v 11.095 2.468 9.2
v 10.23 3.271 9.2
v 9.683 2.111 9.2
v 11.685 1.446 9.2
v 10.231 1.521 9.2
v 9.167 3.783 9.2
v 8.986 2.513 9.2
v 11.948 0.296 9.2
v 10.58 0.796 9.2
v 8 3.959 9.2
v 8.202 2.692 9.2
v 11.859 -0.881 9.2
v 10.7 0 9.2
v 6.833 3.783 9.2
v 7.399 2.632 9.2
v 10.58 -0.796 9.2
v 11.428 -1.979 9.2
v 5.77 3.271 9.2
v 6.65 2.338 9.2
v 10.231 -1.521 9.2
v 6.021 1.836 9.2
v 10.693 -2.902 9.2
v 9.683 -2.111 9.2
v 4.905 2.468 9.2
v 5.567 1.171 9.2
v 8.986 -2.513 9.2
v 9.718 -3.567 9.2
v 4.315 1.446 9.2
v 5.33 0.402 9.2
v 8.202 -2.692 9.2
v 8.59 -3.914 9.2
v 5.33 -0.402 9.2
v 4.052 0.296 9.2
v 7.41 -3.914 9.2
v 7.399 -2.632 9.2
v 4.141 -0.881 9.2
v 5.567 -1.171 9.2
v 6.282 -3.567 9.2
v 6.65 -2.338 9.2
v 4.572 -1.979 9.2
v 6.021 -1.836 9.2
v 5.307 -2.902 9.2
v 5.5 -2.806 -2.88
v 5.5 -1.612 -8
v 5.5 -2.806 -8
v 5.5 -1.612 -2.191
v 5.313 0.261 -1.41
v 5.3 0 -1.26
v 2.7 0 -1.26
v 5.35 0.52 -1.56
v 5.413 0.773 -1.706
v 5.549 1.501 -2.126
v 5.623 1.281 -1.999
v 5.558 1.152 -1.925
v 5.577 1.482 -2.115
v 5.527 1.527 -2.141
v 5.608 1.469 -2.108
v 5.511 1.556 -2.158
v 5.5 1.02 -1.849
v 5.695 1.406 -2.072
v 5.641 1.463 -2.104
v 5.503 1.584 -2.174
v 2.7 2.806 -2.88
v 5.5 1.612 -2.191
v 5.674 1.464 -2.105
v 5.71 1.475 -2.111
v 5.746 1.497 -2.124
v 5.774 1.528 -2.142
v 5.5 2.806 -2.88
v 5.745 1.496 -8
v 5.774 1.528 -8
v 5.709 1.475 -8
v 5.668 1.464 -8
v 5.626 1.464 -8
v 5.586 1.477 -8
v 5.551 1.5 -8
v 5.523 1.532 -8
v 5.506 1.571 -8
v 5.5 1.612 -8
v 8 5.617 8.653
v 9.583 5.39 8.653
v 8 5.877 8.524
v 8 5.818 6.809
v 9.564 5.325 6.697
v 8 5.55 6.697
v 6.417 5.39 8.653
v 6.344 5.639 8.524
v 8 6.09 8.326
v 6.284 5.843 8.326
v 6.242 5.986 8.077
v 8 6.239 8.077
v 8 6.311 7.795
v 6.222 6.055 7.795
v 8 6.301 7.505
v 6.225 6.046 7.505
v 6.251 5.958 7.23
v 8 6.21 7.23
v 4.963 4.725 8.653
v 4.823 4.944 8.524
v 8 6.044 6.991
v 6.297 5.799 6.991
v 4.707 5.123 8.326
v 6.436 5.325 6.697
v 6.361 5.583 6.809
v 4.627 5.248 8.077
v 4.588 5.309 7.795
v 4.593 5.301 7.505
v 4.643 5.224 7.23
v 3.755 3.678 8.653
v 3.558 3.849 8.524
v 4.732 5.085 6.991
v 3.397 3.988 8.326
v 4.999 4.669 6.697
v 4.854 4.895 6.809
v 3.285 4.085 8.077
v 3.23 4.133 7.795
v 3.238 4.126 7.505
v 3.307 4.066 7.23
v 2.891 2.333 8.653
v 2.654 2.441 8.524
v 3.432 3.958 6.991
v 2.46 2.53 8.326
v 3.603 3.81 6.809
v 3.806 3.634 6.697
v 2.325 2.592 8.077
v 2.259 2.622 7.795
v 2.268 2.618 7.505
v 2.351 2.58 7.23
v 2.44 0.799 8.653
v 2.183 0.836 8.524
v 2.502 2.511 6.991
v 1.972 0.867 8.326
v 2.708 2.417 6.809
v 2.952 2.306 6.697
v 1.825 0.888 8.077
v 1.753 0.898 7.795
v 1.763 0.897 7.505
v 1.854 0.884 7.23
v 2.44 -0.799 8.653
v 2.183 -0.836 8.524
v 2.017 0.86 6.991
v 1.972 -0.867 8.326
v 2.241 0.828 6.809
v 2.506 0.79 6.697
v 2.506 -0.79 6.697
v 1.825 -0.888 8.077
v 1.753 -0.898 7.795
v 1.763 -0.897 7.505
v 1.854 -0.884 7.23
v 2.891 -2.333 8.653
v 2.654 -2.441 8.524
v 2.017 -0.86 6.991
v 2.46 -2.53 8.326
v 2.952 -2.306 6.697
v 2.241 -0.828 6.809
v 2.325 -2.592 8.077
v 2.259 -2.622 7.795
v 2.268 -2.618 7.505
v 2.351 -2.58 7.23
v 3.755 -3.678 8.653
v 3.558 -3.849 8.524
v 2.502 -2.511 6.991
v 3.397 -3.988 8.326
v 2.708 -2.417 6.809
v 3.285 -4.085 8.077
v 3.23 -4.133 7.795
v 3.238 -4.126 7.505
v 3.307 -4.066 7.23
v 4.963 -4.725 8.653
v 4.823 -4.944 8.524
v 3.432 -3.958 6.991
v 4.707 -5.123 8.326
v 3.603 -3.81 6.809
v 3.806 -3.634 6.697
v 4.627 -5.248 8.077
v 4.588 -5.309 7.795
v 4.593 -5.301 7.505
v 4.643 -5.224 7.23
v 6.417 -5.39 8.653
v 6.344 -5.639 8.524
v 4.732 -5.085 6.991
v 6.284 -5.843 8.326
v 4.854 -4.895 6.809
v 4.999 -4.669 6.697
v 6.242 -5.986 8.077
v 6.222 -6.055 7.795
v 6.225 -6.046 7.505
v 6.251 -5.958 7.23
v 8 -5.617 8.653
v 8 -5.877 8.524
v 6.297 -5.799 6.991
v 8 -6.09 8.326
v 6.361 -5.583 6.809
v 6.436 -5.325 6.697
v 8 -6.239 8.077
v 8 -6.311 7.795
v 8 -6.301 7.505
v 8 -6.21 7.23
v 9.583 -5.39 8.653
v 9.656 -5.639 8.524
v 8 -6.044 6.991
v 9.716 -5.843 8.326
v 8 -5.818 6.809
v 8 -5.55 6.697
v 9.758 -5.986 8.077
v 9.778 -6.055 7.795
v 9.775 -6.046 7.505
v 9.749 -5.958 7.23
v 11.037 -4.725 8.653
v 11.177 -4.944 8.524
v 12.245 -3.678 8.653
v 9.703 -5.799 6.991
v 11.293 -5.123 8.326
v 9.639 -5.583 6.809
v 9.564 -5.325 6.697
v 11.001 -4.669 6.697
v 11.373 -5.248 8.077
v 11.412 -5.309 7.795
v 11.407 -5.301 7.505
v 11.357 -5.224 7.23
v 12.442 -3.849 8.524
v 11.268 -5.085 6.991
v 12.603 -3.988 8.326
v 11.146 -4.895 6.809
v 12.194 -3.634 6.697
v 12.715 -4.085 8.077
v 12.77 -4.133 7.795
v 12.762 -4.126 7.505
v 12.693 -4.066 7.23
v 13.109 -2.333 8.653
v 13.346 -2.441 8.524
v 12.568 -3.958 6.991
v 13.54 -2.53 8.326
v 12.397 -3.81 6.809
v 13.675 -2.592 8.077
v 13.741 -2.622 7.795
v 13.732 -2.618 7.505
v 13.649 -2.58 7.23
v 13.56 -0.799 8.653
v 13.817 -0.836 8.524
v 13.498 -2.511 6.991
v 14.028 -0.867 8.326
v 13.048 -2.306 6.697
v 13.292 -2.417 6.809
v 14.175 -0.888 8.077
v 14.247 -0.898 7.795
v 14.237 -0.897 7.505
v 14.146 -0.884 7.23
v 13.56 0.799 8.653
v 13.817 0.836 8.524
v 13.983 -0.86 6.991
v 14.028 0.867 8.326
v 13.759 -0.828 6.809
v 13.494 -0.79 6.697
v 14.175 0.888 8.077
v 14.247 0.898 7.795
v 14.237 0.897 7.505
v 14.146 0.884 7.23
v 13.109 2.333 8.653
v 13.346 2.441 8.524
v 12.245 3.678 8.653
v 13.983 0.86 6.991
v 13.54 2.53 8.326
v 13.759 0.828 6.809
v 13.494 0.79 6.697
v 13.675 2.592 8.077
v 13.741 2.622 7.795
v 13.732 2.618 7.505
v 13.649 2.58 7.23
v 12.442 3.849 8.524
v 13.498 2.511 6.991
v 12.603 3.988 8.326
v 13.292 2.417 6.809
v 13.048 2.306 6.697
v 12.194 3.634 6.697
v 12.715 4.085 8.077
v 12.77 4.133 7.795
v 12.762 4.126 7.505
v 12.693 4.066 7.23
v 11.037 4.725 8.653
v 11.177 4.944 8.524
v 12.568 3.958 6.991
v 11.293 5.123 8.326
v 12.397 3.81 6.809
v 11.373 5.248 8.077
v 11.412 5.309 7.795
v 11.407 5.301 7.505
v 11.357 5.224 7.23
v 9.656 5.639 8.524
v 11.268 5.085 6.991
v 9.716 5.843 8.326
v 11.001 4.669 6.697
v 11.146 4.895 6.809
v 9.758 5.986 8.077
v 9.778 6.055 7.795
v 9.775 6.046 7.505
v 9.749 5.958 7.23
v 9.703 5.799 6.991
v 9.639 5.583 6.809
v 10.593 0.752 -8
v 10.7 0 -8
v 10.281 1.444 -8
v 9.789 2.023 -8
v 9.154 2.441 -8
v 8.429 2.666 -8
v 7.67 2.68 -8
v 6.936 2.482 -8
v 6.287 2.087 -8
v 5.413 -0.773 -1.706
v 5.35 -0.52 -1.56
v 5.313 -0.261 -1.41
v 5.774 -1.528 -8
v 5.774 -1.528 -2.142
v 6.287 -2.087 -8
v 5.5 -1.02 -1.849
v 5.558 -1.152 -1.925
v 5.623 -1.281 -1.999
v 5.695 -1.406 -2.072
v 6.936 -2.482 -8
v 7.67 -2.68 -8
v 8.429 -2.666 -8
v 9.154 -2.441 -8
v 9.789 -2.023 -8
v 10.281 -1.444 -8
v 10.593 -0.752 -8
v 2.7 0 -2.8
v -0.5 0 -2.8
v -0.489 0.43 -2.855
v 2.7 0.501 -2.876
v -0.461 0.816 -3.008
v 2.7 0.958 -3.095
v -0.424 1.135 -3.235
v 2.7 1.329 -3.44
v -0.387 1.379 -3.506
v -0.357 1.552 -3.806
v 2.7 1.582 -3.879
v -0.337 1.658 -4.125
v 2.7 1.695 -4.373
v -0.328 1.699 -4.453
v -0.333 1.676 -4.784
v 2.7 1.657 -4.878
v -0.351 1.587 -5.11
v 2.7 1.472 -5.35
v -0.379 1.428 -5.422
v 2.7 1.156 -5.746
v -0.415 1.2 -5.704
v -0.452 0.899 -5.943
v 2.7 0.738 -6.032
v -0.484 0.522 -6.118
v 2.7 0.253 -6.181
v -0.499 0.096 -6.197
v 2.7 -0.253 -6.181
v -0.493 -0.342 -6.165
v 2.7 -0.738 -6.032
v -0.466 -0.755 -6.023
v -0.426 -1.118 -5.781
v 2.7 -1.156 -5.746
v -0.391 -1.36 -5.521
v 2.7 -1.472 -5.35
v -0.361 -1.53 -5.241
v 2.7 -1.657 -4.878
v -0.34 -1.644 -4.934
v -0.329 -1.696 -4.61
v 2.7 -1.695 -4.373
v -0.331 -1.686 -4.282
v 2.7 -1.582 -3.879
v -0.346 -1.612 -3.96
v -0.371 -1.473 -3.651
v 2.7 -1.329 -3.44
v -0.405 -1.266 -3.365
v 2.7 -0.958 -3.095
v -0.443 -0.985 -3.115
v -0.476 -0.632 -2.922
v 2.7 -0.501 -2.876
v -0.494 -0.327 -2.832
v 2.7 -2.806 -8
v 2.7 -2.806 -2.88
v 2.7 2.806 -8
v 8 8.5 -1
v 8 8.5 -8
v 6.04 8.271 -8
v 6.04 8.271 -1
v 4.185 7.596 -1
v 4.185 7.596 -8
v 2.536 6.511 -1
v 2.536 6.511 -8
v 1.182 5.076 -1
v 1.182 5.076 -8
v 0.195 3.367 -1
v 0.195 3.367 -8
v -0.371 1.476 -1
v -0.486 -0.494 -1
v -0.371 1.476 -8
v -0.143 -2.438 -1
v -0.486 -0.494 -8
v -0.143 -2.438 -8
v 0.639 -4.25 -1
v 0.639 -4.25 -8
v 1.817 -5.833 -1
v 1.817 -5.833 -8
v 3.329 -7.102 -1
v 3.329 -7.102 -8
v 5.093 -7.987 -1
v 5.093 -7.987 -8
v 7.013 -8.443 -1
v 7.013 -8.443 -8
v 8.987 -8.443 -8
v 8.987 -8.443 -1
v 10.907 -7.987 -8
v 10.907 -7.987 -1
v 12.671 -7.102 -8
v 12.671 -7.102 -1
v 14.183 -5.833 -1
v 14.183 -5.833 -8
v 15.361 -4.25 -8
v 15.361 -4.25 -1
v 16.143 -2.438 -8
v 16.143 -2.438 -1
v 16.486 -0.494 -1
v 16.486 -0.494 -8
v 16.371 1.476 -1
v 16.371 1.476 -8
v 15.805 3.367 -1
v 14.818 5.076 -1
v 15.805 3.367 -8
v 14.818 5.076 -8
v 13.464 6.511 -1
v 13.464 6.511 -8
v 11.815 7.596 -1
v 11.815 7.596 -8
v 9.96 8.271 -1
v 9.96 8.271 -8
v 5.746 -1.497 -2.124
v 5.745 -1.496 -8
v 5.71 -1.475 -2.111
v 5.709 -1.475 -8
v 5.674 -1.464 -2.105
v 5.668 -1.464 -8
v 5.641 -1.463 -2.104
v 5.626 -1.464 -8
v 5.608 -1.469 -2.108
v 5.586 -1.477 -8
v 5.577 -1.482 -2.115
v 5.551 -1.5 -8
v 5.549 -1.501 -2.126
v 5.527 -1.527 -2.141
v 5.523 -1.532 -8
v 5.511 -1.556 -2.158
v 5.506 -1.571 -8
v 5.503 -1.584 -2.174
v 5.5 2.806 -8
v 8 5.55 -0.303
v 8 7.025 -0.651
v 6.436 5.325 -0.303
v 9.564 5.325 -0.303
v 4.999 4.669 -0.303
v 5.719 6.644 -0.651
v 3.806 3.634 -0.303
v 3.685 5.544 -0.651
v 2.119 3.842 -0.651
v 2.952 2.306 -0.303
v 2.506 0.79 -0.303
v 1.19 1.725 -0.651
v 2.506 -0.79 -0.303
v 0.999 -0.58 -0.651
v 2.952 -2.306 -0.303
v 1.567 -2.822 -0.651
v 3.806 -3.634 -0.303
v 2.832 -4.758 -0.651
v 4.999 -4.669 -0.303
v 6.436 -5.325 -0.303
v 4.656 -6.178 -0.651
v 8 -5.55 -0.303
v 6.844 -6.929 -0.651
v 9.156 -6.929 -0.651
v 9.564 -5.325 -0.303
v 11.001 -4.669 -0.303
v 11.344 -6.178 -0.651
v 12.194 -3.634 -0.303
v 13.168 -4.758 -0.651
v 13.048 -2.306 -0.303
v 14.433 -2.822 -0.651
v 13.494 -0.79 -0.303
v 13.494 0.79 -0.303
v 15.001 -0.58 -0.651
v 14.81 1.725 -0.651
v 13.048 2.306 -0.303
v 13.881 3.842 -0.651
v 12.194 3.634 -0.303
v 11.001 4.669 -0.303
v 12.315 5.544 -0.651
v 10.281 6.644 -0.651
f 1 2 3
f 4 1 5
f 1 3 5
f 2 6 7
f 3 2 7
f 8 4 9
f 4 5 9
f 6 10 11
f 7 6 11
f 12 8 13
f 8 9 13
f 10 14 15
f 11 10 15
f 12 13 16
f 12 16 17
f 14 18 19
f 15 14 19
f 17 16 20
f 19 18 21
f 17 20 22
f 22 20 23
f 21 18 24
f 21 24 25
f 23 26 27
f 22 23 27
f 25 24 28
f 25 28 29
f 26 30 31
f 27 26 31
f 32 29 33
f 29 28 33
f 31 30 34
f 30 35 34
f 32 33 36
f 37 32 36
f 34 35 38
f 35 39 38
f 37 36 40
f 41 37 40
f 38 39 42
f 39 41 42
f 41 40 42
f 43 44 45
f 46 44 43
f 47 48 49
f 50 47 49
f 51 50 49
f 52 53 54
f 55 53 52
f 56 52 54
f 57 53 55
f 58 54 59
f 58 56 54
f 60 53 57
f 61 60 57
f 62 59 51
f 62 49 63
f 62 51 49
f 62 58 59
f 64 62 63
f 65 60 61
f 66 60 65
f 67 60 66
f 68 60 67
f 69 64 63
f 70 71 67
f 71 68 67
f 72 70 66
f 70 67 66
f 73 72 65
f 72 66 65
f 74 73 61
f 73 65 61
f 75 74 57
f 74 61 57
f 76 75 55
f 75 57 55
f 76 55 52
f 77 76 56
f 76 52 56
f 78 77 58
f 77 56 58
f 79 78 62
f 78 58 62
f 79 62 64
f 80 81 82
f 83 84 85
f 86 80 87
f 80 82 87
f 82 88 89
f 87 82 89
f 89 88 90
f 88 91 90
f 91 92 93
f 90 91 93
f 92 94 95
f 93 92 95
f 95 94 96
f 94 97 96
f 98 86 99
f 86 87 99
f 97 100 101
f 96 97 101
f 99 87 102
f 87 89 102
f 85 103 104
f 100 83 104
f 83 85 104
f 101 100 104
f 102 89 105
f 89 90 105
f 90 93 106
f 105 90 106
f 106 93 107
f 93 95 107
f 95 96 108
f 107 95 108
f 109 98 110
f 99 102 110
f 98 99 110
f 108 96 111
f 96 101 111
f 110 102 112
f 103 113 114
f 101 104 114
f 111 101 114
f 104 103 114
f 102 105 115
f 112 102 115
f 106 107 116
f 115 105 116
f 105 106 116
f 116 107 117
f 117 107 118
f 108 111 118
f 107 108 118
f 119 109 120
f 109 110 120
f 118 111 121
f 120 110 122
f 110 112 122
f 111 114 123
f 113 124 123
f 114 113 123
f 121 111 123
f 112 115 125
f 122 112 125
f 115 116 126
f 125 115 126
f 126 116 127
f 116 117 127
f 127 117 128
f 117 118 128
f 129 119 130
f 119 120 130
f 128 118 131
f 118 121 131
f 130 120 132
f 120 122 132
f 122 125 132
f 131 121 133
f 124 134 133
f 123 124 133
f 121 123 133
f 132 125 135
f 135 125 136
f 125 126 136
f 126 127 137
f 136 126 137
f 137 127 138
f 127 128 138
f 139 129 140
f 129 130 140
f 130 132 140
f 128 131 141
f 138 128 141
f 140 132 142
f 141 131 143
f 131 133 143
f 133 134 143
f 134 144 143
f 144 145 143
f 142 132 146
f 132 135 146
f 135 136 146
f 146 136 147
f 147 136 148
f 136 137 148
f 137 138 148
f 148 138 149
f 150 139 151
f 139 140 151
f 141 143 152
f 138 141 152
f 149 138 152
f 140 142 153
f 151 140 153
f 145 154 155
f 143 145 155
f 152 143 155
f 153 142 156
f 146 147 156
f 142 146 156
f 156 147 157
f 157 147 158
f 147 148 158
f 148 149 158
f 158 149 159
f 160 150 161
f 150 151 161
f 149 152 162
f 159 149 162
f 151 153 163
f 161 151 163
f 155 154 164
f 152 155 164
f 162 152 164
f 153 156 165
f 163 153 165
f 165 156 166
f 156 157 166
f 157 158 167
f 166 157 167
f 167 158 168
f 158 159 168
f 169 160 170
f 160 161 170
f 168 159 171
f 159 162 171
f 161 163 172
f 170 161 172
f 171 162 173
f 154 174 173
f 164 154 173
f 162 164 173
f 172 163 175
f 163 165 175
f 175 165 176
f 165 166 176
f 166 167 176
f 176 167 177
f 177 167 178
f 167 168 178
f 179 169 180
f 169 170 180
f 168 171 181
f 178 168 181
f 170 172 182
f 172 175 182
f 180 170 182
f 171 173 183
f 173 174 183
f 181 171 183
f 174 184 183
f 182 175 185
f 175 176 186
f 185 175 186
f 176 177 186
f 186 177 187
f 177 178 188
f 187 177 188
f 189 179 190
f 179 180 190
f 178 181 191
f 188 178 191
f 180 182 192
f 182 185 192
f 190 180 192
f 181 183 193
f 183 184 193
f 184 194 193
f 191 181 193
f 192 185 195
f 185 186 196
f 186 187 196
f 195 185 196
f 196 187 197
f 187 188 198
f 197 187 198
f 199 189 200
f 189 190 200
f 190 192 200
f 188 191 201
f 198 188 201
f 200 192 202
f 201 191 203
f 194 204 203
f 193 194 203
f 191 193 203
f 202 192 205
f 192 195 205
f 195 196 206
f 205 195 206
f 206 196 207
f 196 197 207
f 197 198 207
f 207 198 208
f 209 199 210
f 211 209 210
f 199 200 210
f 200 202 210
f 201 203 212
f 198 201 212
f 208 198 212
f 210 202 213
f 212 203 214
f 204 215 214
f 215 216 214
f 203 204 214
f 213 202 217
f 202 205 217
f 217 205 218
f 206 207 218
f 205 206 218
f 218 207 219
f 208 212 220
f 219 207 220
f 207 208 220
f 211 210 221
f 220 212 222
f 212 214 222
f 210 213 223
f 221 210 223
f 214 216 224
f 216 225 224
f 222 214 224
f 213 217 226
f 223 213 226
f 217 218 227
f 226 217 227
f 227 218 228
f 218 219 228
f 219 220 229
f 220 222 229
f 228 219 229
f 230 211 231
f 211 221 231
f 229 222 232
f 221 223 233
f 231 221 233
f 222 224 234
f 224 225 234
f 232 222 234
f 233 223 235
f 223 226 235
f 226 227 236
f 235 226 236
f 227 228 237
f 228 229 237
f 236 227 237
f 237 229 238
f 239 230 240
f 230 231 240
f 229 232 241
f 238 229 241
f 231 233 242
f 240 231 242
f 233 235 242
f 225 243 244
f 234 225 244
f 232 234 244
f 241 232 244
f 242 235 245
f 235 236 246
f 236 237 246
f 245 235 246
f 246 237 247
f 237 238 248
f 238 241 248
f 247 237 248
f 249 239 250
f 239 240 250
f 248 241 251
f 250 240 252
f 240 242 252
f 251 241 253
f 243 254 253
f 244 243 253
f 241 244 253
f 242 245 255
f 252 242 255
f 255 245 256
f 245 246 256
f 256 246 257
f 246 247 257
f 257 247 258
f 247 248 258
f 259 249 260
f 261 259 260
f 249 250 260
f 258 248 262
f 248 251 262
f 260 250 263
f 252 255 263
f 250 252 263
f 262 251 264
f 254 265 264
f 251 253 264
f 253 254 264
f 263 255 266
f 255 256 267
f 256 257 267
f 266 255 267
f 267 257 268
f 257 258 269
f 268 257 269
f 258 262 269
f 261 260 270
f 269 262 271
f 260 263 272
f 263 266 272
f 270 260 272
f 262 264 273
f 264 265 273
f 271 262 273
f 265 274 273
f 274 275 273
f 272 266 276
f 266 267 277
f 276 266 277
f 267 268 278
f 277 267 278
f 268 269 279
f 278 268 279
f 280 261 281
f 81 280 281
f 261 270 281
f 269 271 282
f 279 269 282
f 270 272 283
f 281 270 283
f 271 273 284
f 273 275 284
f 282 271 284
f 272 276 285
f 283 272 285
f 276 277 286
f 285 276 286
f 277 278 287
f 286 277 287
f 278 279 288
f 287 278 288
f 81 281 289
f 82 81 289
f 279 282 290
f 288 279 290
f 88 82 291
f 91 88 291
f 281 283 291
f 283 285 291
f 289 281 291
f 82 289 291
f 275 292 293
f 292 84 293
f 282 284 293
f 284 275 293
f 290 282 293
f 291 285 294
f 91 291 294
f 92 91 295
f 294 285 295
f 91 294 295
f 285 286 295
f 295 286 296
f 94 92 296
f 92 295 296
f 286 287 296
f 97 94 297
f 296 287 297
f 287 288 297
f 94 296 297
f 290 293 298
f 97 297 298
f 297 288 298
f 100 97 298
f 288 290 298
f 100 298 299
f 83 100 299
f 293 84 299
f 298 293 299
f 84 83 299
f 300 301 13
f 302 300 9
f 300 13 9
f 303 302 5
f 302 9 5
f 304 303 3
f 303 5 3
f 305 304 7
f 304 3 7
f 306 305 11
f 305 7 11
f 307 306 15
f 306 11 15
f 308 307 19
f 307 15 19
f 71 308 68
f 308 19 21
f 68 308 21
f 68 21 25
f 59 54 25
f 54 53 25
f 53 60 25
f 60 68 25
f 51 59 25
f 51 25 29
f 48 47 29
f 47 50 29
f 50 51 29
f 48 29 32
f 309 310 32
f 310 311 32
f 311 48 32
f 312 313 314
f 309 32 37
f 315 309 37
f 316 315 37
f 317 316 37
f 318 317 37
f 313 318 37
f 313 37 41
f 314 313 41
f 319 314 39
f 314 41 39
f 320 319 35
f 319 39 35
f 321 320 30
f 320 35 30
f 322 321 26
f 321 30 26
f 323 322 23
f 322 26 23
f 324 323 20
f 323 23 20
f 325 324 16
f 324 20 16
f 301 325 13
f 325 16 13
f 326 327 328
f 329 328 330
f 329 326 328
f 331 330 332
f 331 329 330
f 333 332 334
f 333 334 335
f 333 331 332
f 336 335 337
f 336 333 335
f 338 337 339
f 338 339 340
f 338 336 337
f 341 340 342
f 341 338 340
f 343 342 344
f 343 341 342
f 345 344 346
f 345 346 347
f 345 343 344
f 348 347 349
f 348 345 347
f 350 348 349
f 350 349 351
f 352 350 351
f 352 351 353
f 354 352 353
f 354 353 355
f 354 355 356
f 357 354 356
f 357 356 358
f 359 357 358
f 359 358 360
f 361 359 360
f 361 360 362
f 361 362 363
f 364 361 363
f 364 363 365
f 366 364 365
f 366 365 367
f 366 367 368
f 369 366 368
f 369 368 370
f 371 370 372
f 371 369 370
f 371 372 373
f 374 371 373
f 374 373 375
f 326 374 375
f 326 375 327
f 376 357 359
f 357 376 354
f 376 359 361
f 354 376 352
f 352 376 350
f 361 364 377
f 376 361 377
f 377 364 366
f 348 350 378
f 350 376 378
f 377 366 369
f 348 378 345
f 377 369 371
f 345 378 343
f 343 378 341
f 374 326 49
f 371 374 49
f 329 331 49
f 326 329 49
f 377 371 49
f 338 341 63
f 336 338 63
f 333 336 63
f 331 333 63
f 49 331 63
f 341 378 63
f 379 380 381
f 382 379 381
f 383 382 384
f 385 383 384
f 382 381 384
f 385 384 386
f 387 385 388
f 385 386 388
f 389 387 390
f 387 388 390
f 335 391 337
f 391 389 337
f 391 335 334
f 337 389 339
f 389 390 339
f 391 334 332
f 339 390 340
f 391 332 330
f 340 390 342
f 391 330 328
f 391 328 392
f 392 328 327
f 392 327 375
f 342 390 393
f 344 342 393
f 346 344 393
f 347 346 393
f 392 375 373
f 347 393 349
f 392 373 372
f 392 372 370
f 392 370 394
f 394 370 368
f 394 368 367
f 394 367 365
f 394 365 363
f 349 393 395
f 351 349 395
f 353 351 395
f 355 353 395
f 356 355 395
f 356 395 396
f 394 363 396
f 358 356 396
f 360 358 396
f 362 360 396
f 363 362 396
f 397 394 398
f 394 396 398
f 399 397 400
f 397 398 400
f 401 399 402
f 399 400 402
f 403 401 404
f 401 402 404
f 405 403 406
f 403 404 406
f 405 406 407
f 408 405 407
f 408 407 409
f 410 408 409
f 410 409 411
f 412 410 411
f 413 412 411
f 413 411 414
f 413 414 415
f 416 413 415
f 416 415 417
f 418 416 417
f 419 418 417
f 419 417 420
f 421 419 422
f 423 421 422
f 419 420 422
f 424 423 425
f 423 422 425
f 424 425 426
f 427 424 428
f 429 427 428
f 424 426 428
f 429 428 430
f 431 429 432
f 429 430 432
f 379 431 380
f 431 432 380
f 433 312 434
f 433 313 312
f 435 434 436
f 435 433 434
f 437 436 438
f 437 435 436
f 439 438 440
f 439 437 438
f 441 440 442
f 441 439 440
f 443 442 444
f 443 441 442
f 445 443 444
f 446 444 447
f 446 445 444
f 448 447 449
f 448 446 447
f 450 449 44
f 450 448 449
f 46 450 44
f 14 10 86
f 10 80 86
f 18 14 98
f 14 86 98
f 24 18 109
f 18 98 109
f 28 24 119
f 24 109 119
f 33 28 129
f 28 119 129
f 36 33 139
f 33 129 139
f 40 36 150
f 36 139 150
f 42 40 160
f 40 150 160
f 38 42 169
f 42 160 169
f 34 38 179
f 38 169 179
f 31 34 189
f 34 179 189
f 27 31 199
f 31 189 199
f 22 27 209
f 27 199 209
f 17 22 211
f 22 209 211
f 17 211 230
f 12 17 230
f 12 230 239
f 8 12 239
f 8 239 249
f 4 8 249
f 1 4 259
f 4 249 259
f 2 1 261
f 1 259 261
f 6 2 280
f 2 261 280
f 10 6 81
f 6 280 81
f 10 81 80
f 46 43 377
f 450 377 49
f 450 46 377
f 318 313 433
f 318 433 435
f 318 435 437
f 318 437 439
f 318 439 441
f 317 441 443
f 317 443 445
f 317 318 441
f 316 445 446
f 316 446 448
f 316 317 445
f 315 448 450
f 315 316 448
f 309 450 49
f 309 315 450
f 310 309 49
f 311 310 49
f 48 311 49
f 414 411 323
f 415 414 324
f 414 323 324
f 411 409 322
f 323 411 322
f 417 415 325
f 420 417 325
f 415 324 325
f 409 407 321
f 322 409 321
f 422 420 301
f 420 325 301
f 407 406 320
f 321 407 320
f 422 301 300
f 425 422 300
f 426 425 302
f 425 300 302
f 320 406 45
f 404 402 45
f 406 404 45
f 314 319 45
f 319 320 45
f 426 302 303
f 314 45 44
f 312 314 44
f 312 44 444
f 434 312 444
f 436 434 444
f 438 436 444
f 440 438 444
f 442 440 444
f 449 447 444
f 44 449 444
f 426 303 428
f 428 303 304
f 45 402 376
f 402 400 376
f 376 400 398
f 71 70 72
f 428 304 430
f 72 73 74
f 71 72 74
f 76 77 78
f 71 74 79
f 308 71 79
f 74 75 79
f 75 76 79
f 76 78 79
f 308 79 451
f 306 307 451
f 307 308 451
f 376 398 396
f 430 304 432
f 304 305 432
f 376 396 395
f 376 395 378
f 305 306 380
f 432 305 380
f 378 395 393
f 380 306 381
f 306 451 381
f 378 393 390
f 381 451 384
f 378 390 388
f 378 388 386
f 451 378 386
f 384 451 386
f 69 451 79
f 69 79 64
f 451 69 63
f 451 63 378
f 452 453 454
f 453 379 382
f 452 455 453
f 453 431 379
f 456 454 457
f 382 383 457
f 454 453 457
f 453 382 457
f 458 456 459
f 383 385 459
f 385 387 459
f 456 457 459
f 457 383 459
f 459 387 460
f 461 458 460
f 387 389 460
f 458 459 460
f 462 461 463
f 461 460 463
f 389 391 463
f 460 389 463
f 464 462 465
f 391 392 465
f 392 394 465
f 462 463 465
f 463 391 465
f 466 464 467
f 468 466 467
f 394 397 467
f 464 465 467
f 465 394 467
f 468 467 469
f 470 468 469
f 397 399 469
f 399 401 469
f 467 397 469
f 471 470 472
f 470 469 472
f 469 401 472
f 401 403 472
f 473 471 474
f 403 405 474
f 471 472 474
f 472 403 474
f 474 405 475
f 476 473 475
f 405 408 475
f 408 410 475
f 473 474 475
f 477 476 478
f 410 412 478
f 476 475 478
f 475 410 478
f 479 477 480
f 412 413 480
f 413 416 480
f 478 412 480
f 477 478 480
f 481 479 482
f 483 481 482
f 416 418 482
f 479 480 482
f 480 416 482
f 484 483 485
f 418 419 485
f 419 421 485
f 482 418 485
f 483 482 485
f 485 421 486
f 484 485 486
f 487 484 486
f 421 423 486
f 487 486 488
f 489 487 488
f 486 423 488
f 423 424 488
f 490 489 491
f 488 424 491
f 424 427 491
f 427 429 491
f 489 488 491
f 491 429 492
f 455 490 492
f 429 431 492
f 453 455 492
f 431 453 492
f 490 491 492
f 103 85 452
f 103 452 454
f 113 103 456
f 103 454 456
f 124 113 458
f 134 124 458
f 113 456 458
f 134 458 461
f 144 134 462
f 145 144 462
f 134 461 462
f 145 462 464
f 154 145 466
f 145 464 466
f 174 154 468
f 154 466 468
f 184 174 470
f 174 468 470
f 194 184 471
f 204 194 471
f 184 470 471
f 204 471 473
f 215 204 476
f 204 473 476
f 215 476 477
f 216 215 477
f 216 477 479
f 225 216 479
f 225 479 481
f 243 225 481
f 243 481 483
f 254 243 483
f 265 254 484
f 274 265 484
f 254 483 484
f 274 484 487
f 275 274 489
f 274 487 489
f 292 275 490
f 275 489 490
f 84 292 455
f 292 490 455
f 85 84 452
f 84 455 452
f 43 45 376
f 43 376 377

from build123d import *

# Parameters (mm, degrees)
BORE_START          = 1
SKETCH_2_R          = 2.7
BORE_DEPTH          = 22.98427983
FIX_START           = 3.2
SKETCH_4_R          = 1.7
FIX_2_DEPTH         = 18.78427983
CUT_EXTRUDE_START   = 2.5
CUT_EXTRUDE_1_DEPTH = 2.8
MOVE_BODY_1_ANGLE   = 90
FILLET_1_R          = 0.15


with BuildPart() as part:
    # Эскиз1 → Body (revolve)
    with BuildSketch(Plane.XY):
        with BuildLine():
            Line((0, 8.5), (0, 0))
            Line((0, 0), (17.2, 0))
            Line((17.2, 0), (17.2, 3.958583851))
            Line((17.2, 3.958583851), (16.652924896, 5.61704678))
            ThreePointArc((16.652924896, 5.61704678), (15.650028154, 6.31642018), (14.697387016, 5.55))
            Line((14.697387016, 5.55), (7.697387016, 5.55))
            Line((7.697387016, 5.55), (7, 8.5))
            Line((7, 8.5), (0, 8.5))
        make_face()
    revolve(axis=Axis((0, 0, 0), (1, 0, 0)))

    # Эскиз2 → Bore (cut, through all)
    with BuildSketch(Plane(origin=(17.2, 0, 0), x_dir=(0, 0, -1), z_dir=(1, 0, 0)).offset(BORE_START)):
        Circle(SKETCH_2_R)
    extrude(amount=-BORE_DEPTH, mode=Mode.SUBTRACT)

    # Эскиз4 → Fix 2 (cut, through all)
    with BuildSketch(Plane.XY.offset(FIX_START)):
        with Locations((3.5, 0)):
            Circle(SKETCH_4_R)
    extrude(amount=FIX_2_DEPTH, mode=Mode.SUBTRACT)

    # Эскиз4<3> → Вырез-Вытянуть1 (cut)
    with BuildSketch(Plane.XY.offset(CUT_EXTRUDE_START)):
        Polygon((5.120135639, 2.806157241), (-1.112463997, 2.806157241), (-1.112463997, -2.806157241), (5.120135639, -2.806157241), (6.740271277, 0), align=None)
    extrude(amount=CUT_EXTRUDE_1_DEPTH, mode=Mode.SUBTRACT)


with BuildPart() as part_1:
    # Move Body 1: moved
    add(part.part.rotate(Axis((8, 0, 0), (0, -1, 0)), MOVE_BODY_1_ANGLE))

    # Скругление1
    fillet_1_edges = [part_1.edges().sort_by_distance(p)[0] for p in [
        (5.5, -1.019803903, -4.92425639),
        (5.5, 1.019803903, -4.92425639),
    ]]
    fillet(fillet_1_edges, radius=FILLET_1_R)


solid = part_1.part
